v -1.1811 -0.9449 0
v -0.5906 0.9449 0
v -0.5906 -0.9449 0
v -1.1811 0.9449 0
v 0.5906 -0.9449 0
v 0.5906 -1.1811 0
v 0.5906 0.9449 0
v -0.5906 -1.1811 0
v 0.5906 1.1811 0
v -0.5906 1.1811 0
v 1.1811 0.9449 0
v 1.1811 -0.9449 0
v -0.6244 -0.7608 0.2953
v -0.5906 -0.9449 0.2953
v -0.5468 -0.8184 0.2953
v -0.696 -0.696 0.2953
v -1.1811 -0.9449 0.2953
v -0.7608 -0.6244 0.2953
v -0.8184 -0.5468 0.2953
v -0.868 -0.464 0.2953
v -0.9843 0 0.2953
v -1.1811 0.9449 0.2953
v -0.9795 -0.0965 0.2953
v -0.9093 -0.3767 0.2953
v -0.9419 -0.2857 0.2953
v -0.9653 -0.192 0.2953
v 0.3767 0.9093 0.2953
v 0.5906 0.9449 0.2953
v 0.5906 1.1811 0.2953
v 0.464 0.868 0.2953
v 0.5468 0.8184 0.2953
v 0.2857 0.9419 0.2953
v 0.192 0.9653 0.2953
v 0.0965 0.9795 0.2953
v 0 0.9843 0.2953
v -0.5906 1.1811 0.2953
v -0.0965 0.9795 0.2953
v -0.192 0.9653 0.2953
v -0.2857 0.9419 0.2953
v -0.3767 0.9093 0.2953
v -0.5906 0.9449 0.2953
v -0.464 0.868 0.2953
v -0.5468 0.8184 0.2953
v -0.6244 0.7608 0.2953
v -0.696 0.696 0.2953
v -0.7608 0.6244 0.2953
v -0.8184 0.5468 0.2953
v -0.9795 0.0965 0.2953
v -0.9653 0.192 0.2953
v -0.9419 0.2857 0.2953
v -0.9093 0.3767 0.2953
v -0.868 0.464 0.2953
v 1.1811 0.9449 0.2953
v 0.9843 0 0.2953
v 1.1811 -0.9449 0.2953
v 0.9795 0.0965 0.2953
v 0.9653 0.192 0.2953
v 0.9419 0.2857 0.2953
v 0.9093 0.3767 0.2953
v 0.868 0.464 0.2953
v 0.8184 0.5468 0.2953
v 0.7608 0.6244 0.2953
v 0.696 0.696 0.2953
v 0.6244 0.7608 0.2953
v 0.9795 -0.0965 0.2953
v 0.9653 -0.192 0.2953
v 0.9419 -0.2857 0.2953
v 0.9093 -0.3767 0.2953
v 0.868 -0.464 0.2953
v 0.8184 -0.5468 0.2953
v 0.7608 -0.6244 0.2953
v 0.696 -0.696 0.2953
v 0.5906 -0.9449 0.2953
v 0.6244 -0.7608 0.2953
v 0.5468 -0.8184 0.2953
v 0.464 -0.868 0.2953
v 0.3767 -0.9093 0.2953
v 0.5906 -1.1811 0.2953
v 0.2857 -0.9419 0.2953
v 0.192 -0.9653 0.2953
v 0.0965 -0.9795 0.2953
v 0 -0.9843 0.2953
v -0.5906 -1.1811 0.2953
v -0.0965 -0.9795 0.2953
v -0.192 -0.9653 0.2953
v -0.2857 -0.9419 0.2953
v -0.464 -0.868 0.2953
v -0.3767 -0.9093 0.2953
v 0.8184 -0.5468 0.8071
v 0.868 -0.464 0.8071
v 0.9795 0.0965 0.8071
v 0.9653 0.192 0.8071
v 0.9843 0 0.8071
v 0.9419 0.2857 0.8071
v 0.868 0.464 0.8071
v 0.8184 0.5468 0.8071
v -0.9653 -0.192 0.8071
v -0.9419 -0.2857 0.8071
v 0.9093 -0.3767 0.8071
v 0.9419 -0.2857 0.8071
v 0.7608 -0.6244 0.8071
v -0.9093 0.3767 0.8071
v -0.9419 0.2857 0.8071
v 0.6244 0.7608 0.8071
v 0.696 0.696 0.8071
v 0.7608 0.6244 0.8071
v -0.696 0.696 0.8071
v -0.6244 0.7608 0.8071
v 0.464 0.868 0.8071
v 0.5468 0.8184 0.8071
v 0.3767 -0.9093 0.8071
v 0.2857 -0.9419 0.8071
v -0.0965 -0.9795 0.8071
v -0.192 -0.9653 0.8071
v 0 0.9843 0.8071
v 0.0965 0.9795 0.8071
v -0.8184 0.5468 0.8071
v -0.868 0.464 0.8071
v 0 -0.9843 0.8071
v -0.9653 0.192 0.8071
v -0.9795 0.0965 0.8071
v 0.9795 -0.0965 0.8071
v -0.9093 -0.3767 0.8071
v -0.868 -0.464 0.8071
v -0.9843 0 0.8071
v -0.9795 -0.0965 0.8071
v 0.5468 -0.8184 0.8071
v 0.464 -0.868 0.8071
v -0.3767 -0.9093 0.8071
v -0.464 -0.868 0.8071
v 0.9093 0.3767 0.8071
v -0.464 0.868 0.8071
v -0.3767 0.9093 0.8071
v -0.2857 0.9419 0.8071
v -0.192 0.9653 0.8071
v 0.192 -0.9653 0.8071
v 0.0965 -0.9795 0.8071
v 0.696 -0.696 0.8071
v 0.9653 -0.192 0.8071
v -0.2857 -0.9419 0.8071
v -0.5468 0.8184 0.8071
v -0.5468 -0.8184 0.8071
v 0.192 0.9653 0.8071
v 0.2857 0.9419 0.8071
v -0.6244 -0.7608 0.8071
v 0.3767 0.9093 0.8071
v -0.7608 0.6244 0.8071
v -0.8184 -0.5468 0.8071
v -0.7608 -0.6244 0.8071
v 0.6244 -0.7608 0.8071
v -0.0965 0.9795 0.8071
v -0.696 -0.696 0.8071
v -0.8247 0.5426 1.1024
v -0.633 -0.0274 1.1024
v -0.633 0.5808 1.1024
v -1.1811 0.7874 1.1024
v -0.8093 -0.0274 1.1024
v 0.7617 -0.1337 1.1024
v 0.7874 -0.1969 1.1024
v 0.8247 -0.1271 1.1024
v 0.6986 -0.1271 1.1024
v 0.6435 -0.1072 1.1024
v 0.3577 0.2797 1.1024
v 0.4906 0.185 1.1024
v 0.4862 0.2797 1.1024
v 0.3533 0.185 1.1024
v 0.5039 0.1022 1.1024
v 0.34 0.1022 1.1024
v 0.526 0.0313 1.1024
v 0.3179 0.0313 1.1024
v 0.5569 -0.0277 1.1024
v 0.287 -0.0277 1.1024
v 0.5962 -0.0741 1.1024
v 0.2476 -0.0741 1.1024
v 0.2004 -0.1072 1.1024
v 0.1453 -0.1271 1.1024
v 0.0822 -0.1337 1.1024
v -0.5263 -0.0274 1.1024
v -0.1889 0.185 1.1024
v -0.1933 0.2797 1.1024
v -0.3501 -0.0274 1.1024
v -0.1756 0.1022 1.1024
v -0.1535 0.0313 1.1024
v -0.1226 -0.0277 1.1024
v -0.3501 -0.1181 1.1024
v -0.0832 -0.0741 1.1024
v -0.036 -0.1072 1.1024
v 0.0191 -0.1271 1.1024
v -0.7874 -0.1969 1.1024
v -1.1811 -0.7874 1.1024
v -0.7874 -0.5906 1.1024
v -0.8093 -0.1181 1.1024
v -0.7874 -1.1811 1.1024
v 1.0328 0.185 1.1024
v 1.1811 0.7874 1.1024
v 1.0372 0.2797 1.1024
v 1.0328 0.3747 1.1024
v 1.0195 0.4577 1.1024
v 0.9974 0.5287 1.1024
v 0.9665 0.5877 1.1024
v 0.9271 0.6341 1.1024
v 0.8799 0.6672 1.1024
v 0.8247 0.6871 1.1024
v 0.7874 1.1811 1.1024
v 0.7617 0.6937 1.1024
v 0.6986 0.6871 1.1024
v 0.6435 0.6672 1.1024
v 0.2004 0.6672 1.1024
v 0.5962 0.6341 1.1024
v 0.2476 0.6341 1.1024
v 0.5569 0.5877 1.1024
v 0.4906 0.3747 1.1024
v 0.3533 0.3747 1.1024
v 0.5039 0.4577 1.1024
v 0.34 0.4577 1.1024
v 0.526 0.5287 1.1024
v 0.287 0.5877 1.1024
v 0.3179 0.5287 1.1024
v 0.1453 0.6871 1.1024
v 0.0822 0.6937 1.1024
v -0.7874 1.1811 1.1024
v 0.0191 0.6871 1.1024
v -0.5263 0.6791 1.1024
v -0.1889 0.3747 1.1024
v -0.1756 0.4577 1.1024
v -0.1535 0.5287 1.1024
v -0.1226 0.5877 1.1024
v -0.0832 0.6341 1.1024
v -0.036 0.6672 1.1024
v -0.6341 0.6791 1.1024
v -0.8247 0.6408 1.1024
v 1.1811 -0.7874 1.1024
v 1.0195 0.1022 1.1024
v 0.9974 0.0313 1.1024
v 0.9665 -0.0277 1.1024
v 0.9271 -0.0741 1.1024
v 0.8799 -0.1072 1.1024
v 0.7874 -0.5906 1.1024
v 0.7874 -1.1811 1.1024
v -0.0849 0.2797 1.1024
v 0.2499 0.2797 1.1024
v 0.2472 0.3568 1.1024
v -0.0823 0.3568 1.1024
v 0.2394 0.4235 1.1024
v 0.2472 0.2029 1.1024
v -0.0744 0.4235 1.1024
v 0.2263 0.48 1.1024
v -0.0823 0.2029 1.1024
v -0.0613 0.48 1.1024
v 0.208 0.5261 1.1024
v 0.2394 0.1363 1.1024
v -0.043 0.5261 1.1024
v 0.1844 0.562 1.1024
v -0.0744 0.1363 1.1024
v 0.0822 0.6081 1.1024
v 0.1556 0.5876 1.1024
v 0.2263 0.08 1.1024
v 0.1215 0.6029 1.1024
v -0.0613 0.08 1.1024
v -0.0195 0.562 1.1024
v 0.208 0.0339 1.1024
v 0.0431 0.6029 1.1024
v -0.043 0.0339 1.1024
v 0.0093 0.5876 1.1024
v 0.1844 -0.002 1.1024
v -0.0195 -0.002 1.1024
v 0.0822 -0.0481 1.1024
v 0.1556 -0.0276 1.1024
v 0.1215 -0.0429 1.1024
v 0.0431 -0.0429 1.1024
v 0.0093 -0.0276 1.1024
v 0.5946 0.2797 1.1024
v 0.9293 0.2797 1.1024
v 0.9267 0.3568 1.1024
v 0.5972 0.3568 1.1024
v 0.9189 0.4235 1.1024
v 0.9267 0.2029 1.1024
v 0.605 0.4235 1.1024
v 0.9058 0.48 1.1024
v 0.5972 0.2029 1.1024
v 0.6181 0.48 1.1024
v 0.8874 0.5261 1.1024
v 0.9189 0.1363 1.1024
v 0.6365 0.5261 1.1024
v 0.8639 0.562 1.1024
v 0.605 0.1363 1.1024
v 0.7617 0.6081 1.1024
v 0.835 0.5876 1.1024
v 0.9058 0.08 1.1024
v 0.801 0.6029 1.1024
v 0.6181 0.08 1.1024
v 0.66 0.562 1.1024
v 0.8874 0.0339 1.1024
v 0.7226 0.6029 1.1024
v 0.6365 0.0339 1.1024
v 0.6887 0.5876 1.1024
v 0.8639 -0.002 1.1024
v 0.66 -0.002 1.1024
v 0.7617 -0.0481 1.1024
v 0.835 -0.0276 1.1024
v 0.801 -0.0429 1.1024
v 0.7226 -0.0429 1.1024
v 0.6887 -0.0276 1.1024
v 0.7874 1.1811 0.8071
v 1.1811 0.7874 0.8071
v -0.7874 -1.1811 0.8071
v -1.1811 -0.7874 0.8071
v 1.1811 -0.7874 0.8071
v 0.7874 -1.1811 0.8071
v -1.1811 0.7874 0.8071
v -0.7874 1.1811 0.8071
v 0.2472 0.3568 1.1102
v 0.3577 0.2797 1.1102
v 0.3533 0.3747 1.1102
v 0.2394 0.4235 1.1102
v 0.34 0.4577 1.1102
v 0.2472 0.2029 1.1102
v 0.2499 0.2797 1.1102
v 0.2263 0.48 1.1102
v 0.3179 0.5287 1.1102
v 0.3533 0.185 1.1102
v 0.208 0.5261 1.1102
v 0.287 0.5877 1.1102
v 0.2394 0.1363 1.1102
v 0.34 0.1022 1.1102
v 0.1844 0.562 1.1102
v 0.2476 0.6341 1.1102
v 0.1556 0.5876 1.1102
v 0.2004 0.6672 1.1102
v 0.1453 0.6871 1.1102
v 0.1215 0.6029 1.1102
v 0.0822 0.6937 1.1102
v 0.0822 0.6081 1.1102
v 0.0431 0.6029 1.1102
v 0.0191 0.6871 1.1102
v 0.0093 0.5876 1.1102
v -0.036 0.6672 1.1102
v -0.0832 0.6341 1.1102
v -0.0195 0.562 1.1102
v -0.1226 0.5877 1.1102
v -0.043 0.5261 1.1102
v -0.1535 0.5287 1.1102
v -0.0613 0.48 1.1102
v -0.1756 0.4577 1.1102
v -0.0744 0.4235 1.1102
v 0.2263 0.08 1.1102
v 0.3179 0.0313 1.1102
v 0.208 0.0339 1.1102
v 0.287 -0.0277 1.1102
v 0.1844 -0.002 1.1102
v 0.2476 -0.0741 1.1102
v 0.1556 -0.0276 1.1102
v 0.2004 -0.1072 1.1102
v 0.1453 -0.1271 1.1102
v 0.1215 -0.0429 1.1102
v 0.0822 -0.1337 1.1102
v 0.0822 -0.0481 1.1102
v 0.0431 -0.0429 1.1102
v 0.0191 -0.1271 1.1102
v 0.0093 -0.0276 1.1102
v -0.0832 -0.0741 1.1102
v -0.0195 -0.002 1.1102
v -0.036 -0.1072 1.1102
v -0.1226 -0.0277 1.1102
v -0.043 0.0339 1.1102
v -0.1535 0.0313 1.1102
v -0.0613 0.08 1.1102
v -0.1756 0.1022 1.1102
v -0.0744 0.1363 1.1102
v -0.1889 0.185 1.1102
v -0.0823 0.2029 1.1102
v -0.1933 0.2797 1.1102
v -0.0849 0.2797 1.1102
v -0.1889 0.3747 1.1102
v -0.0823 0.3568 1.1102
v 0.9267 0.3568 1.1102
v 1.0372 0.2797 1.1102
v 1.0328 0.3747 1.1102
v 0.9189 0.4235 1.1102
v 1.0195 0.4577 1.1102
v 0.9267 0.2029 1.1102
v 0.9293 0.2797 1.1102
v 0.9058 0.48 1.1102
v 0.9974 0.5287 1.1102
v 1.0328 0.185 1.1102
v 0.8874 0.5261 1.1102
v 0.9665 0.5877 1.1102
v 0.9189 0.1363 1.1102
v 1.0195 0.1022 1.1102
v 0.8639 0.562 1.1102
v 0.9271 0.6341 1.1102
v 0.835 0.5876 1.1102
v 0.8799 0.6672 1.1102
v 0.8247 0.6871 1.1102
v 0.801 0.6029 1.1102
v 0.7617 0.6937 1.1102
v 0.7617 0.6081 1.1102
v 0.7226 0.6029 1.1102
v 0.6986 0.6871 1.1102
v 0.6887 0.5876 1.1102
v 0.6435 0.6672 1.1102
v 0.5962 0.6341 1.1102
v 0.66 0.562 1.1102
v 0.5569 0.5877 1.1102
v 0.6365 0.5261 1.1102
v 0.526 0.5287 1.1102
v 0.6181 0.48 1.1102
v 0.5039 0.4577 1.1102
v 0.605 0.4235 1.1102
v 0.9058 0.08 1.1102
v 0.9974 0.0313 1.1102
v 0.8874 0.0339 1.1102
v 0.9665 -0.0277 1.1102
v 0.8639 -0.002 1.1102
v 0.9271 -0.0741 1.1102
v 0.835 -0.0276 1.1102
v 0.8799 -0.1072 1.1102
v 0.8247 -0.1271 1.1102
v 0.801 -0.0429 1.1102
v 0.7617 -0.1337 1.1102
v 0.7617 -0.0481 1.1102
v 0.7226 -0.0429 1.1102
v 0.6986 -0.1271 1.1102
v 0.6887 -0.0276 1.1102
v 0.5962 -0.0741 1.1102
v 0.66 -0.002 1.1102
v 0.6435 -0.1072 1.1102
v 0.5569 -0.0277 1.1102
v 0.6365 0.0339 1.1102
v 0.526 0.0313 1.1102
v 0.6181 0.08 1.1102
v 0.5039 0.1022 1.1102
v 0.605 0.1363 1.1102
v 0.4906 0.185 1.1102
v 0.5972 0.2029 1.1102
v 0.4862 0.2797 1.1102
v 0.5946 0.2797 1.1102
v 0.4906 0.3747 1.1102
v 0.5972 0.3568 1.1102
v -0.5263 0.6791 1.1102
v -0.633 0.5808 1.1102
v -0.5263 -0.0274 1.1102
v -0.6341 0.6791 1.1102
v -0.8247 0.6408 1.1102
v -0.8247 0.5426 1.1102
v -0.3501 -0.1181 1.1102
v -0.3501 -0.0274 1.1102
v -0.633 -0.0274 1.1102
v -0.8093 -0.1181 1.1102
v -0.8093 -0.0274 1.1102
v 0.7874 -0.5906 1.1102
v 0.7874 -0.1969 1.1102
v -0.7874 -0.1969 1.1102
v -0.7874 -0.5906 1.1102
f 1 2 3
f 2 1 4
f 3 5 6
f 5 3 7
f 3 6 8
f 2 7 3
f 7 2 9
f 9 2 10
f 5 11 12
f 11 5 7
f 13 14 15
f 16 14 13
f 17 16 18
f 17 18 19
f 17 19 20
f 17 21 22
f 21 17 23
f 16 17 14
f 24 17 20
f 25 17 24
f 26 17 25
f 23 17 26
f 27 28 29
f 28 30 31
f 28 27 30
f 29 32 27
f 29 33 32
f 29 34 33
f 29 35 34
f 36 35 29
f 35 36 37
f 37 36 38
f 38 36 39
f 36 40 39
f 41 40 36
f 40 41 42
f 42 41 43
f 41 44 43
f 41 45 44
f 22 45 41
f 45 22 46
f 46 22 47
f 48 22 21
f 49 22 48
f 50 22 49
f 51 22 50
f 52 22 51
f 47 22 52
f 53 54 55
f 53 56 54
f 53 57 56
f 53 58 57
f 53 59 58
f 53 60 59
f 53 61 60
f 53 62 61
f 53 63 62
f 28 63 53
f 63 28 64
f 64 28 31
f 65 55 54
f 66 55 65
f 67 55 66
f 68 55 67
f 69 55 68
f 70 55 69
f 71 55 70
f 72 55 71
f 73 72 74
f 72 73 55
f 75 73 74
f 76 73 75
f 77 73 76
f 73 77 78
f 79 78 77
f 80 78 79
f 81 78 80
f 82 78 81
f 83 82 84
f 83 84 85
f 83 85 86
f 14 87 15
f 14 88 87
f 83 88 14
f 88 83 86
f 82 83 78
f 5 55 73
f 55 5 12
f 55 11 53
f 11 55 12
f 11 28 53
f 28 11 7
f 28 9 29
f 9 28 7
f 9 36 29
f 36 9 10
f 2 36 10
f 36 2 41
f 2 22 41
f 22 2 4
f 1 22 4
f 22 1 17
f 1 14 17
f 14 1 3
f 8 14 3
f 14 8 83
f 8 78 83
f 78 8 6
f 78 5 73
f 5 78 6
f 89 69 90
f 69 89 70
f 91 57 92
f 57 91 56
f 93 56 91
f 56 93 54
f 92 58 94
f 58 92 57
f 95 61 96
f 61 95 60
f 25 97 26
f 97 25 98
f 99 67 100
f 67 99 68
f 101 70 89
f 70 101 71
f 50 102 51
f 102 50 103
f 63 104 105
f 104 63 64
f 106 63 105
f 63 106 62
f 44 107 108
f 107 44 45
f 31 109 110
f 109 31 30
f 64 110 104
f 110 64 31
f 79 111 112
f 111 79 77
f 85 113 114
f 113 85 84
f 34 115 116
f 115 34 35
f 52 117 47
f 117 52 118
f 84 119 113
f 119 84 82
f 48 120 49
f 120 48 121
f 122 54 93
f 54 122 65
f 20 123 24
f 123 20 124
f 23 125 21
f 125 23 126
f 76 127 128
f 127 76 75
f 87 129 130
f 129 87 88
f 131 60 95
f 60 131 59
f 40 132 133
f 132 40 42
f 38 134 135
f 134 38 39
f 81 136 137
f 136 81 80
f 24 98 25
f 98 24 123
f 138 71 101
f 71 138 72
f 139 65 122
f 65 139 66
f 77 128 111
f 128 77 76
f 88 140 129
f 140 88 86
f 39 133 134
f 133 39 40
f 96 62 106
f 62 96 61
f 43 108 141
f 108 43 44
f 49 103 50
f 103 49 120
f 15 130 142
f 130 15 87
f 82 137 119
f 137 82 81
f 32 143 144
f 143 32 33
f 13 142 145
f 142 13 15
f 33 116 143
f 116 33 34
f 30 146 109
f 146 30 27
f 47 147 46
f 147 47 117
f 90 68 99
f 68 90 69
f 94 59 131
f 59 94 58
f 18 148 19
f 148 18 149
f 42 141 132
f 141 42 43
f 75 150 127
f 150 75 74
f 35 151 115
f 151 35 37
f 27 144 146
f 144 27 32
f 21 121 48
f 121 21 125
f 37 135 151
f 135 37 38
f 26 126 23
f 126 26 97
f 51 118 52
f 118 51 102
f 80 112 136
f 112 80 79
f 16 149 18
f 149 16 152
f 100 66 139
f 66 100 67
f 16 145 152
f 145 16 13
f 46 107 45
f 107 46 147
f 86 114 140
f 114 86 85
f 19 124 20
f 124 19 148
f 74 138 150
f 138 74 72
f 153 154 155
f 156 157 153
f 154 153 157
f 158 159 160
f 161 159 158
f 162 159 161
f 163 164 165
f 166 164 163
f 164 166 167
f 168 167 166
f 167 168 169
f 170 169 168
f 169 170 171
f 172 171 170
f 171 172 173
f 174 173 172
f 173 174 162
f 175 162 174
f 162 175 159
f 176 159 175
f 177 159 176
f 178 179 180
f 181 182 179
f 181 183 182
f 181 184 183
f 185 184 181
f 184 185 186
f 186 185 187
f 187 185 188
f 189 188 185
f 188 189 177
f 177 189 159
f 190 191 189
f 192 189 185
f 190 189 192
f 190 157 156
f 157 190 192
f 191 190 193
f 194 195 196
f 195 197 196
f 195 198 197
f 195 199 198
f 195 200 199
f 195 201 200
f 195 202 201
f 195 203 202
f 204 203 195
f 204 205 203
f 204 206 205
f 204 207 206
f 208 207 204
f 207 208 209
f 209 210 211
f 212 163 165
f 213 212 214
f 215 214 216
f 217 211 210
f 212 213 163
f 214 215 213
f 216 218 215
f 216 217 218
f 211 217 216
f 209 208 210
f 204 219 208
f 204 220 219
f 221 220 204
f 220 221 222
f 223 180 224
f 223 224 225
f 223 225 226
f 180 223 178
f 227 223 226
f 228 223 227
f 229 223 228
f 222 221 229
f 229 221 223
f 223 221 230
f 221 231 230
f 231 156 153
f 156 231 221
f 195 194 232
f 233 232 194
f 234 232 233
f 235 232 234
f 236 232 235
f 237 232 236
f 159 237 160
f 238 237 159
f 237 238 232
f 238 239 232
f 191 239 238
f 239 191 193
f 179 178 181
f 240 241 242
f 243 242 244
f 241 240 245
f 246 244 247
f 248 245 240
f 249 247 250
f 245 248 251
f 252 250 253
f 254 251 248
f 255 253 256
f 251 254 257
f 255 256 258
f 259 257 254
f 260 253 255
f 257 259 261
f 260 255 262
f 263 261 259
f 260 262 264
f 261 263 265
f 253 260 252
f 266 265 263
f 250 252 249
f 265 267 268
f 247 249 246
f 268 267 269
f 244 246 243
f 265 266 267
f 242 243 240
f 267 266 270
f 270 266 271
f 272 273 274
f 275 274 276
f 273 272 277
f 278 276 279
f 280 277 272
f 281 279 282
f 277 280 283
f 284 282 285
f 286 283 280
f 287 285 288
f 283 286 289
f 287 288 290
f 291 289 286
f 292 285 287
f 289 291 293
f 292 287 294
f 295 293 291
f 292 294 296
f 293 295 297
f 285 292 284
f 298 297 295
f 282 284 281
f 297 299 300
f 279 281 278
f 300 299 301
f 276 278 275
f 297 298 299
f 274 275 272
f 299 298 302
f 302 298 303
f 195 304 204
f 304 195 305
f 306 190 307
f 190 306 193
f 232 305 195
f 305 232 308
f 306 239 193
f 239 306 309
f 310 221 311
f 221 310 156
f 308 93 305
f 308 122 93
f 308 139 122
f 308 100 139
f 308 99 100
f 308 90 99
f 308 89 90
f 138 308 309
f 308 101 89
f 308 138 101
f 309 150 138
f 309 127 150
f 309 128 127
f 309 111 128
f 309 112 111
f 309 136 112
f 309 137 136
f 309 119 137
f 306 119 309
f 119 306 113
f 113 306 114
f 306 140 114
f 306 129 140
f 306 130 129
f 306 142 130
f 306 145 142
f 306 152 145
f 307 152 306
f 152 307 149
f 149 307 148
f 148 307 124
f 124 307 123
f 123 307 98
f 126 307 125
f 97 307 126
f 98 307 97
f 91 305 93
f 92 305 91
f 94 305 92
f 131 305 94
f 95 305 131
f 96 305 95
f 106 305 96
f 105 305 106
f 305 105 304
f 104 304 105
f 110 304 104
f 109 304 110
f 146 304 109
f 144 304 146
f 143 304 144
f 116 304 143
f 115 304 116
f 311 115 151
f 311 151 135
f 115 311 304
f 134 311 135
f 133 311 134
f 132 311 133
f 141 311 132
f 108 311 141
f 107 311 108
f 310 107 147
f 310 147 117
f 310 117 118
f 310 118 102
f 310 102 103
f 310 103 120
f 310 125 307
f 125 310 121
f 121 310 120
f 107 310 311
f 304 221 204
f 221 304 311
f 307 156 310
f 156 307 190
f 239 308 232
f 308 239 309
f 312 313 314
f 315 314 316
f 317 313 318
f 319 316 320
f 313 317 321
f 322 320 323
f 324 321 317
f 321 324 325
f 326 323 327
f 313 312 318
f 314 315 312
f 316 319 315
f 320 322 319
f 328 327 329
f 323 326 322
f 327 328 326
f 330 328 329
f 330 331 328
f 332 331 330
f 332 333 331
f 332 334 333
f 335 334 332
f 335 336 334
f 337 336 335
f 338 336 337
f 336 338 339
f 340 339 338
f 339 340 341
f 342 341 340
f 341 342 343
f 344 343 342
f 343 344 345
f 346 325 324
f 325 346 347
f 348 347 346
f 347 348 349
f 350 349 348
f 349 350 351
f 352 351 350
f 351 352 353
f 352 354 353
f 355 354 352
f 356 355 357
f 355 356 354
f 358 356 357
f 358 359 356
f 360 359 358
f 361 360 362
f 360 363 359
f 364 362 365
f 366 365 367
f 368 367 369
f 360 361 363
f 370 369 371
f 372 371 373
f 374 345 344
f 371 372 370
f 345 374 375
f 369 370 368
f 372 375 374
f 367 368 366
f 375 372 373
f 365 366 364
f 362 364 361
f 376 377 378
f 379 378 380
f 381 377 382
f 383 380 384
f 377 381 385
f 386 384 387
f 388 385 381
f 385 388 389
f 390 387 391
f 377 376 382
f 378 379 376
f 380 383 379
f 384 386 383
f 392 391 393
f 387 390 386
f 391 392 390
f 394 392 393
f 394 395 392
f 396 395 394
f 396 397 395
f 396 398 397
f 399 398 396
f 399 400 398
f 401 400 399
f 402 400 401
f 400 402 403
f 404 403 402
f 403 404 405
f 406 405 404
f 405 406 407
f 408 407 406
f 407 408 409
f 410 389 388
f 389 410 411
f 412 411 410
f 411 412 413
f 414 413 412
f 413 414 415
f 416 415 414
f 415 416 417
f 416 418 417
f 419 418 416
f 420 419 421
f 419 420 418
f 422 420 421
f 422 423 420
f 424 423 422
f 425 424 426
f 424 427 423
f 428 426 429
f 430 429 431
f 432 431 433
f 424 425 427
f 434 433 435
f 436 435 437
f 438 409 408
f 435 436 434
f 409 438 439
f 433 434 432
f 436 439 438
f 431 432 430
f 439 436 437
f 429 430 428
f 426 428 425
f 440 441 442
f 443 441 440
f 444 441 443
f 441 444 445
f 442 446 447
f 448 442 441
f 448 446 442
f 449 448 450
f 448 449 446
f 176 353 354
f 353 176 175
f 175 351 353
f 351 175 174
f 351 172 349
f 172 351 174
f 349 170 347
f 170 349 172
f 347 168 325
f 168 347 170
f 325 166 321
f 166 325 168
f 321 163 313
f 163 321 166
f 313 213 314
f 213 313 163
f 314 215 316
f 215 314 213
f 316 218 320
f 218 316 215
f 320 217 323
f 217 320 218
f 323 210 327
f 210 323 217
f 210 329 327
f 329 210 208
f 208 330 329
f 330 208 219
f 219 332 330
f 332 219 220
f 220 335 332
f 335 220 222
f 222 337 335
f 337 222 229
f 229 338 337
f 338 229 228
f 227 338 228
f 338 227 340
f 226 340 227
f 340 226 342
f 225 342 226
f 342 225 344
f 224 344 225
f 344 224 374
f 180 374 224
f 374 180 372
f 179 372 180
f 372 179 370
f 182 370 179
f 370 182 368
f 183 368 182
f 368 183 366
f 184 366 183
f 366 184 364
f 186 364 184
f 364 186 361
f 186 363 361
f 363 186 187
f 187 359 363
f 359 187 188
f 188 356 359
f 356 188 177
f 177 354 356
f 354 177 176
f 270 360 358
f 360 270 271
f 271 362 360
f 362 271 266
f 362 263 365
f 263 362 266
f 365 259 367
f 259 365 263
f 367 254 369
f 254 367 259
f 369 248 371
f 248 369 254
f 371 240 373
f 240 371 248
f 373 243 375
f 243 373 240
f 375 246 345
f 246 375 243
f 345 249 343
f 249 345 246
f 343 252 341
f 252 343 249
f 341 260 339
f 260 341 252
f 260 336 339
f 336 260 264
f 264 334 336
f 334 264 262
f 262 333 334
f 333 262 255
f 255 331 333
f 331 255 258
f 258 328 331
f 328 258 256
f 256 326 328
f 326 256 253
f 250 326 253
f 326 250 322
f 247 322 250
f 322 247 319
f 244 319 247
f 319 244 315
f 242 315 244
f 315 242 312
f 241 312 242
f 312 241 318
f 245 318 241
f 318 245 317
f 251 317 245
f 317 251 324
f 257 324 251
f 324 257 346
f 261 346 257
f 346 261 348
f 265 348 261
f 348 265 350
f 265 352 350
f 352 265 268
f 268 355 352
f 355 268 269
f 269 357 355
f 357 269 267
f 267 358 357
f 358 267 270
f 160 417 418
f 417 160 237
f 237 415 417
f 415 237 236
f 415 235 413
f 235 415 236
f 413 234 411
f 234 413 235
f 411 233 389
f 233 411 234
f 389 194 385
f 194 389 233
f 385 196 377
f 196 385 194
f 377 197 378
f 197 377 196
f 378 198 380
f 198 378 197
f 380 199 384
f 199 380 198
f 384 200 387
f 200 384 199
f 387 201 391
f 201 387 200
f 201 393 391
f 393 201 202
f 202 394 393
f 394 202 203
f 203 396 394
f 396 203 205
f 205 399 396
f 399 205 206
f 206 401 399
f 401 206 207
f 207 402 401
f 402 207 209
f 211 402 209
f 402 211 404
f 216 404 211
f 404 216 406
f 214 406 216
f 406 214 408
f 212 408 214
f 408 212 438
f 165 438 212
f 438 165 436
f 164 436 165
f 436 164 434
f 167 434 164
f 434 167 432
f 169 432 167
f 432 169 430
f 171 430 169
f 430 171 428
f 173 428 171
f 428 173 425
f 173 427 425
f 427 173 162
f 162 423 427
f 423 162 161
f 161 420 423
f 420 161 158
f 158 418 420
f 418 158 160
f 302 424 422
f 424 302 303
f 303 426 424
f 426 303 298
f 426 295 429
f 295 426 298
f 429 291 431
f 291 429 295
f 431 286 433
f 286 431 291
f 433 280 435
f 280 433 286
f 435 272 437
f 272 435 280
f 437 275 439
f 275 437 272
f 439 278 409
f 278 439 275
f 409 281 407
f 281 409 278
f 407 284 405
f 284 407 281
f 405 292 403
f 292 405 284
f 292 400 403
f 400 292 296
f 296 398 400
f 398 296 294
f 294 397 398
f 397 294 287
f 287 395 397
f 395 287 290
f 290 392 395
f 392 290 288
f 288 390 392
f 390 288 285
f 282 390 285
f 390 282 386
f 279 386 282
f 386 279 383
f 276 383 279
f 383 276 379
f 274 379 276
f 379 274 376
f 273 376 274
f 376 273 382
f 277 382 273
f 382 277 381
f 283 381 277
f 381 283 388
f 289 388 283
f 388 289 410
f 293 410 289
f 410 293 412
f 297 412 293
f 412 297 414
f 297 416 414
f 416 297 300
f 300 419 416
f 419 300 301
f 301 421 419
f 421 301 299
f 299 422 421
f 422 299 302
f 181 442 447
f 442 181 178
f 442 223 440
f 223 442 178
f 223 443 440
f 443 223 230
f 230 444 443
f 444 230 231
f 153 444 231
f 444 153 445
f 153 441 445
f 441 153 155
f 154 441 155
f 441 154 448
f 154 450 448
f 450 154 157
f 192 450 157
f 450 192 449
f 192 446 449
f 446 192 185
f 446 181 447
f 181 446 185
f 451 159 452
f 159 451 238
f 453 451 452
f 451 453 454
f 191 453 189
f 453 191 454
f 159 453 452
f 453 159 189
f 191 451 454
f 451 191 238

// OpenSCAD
// file: defines.scad
// example012.stl is Mblock.stl, (c) 2009 Will Langford
// licensed under the Creative Commons - GNU GPL license.
// http://www.thingiverse.com/thing:753

//import("sim800c.stl", convexity=3);

// PCB

L = 6.0;
W = 6.0;
H = 2.8;
e = 1.35;
pin_fragments = 16;

scale = 1/2.54;
// file: Inductor_NR6028T100M-label.scad
include <defines.scad>

/*font = "Liberation Sans";*/
/*font = "DejaVu";*/
font = "Abyssinica SIL";

// Label
scale(scale) color("White") {

    translate([-L/2.5, -W/20, H]) {
        scale(0.2)
        linear_extrude(height = 0.1, center=false) {
            text("100", font = font);
        }

    }
    translate([-L/3, -W/4, H]) {
        cube(size = [4, 1, 0.02], center = false);
    }

}
// file: Inductor_NR6028T100M-body.scad
include <defines.scad>

scale(scale) color("Grey")
union() {
// Base

translate([-L/2, -W/2, 0])
  linear_extrude(height = 0.75, center = false)
    polygon([[0,0.6],[0,5.4],[1.5,5.4],[1.5,6],[4.5,6],[4.5,5.4],[6,5.4],[6,0.6],[4.5,0.6],[4.5,0],[1.5,0],[1.5,0.6]]);

// Body
/*translate([-L/2, -W/2, H-0.75])*/
    cylinder(r = 2.5, h = H, $fn = 64);

// Head
translate([-L/2, -W/2, H-0.75])
  linear_extrude(height = 0.75, center = false)
    polygon([[0,1],[0,5],[1,6],[5,6],[6,5],[6,1],[5,0],[1,0]]);

}
// main file
include <Inductor_NR6028T100M-body.scad>
include <Inductor_NR6028T100M-label.scad>
